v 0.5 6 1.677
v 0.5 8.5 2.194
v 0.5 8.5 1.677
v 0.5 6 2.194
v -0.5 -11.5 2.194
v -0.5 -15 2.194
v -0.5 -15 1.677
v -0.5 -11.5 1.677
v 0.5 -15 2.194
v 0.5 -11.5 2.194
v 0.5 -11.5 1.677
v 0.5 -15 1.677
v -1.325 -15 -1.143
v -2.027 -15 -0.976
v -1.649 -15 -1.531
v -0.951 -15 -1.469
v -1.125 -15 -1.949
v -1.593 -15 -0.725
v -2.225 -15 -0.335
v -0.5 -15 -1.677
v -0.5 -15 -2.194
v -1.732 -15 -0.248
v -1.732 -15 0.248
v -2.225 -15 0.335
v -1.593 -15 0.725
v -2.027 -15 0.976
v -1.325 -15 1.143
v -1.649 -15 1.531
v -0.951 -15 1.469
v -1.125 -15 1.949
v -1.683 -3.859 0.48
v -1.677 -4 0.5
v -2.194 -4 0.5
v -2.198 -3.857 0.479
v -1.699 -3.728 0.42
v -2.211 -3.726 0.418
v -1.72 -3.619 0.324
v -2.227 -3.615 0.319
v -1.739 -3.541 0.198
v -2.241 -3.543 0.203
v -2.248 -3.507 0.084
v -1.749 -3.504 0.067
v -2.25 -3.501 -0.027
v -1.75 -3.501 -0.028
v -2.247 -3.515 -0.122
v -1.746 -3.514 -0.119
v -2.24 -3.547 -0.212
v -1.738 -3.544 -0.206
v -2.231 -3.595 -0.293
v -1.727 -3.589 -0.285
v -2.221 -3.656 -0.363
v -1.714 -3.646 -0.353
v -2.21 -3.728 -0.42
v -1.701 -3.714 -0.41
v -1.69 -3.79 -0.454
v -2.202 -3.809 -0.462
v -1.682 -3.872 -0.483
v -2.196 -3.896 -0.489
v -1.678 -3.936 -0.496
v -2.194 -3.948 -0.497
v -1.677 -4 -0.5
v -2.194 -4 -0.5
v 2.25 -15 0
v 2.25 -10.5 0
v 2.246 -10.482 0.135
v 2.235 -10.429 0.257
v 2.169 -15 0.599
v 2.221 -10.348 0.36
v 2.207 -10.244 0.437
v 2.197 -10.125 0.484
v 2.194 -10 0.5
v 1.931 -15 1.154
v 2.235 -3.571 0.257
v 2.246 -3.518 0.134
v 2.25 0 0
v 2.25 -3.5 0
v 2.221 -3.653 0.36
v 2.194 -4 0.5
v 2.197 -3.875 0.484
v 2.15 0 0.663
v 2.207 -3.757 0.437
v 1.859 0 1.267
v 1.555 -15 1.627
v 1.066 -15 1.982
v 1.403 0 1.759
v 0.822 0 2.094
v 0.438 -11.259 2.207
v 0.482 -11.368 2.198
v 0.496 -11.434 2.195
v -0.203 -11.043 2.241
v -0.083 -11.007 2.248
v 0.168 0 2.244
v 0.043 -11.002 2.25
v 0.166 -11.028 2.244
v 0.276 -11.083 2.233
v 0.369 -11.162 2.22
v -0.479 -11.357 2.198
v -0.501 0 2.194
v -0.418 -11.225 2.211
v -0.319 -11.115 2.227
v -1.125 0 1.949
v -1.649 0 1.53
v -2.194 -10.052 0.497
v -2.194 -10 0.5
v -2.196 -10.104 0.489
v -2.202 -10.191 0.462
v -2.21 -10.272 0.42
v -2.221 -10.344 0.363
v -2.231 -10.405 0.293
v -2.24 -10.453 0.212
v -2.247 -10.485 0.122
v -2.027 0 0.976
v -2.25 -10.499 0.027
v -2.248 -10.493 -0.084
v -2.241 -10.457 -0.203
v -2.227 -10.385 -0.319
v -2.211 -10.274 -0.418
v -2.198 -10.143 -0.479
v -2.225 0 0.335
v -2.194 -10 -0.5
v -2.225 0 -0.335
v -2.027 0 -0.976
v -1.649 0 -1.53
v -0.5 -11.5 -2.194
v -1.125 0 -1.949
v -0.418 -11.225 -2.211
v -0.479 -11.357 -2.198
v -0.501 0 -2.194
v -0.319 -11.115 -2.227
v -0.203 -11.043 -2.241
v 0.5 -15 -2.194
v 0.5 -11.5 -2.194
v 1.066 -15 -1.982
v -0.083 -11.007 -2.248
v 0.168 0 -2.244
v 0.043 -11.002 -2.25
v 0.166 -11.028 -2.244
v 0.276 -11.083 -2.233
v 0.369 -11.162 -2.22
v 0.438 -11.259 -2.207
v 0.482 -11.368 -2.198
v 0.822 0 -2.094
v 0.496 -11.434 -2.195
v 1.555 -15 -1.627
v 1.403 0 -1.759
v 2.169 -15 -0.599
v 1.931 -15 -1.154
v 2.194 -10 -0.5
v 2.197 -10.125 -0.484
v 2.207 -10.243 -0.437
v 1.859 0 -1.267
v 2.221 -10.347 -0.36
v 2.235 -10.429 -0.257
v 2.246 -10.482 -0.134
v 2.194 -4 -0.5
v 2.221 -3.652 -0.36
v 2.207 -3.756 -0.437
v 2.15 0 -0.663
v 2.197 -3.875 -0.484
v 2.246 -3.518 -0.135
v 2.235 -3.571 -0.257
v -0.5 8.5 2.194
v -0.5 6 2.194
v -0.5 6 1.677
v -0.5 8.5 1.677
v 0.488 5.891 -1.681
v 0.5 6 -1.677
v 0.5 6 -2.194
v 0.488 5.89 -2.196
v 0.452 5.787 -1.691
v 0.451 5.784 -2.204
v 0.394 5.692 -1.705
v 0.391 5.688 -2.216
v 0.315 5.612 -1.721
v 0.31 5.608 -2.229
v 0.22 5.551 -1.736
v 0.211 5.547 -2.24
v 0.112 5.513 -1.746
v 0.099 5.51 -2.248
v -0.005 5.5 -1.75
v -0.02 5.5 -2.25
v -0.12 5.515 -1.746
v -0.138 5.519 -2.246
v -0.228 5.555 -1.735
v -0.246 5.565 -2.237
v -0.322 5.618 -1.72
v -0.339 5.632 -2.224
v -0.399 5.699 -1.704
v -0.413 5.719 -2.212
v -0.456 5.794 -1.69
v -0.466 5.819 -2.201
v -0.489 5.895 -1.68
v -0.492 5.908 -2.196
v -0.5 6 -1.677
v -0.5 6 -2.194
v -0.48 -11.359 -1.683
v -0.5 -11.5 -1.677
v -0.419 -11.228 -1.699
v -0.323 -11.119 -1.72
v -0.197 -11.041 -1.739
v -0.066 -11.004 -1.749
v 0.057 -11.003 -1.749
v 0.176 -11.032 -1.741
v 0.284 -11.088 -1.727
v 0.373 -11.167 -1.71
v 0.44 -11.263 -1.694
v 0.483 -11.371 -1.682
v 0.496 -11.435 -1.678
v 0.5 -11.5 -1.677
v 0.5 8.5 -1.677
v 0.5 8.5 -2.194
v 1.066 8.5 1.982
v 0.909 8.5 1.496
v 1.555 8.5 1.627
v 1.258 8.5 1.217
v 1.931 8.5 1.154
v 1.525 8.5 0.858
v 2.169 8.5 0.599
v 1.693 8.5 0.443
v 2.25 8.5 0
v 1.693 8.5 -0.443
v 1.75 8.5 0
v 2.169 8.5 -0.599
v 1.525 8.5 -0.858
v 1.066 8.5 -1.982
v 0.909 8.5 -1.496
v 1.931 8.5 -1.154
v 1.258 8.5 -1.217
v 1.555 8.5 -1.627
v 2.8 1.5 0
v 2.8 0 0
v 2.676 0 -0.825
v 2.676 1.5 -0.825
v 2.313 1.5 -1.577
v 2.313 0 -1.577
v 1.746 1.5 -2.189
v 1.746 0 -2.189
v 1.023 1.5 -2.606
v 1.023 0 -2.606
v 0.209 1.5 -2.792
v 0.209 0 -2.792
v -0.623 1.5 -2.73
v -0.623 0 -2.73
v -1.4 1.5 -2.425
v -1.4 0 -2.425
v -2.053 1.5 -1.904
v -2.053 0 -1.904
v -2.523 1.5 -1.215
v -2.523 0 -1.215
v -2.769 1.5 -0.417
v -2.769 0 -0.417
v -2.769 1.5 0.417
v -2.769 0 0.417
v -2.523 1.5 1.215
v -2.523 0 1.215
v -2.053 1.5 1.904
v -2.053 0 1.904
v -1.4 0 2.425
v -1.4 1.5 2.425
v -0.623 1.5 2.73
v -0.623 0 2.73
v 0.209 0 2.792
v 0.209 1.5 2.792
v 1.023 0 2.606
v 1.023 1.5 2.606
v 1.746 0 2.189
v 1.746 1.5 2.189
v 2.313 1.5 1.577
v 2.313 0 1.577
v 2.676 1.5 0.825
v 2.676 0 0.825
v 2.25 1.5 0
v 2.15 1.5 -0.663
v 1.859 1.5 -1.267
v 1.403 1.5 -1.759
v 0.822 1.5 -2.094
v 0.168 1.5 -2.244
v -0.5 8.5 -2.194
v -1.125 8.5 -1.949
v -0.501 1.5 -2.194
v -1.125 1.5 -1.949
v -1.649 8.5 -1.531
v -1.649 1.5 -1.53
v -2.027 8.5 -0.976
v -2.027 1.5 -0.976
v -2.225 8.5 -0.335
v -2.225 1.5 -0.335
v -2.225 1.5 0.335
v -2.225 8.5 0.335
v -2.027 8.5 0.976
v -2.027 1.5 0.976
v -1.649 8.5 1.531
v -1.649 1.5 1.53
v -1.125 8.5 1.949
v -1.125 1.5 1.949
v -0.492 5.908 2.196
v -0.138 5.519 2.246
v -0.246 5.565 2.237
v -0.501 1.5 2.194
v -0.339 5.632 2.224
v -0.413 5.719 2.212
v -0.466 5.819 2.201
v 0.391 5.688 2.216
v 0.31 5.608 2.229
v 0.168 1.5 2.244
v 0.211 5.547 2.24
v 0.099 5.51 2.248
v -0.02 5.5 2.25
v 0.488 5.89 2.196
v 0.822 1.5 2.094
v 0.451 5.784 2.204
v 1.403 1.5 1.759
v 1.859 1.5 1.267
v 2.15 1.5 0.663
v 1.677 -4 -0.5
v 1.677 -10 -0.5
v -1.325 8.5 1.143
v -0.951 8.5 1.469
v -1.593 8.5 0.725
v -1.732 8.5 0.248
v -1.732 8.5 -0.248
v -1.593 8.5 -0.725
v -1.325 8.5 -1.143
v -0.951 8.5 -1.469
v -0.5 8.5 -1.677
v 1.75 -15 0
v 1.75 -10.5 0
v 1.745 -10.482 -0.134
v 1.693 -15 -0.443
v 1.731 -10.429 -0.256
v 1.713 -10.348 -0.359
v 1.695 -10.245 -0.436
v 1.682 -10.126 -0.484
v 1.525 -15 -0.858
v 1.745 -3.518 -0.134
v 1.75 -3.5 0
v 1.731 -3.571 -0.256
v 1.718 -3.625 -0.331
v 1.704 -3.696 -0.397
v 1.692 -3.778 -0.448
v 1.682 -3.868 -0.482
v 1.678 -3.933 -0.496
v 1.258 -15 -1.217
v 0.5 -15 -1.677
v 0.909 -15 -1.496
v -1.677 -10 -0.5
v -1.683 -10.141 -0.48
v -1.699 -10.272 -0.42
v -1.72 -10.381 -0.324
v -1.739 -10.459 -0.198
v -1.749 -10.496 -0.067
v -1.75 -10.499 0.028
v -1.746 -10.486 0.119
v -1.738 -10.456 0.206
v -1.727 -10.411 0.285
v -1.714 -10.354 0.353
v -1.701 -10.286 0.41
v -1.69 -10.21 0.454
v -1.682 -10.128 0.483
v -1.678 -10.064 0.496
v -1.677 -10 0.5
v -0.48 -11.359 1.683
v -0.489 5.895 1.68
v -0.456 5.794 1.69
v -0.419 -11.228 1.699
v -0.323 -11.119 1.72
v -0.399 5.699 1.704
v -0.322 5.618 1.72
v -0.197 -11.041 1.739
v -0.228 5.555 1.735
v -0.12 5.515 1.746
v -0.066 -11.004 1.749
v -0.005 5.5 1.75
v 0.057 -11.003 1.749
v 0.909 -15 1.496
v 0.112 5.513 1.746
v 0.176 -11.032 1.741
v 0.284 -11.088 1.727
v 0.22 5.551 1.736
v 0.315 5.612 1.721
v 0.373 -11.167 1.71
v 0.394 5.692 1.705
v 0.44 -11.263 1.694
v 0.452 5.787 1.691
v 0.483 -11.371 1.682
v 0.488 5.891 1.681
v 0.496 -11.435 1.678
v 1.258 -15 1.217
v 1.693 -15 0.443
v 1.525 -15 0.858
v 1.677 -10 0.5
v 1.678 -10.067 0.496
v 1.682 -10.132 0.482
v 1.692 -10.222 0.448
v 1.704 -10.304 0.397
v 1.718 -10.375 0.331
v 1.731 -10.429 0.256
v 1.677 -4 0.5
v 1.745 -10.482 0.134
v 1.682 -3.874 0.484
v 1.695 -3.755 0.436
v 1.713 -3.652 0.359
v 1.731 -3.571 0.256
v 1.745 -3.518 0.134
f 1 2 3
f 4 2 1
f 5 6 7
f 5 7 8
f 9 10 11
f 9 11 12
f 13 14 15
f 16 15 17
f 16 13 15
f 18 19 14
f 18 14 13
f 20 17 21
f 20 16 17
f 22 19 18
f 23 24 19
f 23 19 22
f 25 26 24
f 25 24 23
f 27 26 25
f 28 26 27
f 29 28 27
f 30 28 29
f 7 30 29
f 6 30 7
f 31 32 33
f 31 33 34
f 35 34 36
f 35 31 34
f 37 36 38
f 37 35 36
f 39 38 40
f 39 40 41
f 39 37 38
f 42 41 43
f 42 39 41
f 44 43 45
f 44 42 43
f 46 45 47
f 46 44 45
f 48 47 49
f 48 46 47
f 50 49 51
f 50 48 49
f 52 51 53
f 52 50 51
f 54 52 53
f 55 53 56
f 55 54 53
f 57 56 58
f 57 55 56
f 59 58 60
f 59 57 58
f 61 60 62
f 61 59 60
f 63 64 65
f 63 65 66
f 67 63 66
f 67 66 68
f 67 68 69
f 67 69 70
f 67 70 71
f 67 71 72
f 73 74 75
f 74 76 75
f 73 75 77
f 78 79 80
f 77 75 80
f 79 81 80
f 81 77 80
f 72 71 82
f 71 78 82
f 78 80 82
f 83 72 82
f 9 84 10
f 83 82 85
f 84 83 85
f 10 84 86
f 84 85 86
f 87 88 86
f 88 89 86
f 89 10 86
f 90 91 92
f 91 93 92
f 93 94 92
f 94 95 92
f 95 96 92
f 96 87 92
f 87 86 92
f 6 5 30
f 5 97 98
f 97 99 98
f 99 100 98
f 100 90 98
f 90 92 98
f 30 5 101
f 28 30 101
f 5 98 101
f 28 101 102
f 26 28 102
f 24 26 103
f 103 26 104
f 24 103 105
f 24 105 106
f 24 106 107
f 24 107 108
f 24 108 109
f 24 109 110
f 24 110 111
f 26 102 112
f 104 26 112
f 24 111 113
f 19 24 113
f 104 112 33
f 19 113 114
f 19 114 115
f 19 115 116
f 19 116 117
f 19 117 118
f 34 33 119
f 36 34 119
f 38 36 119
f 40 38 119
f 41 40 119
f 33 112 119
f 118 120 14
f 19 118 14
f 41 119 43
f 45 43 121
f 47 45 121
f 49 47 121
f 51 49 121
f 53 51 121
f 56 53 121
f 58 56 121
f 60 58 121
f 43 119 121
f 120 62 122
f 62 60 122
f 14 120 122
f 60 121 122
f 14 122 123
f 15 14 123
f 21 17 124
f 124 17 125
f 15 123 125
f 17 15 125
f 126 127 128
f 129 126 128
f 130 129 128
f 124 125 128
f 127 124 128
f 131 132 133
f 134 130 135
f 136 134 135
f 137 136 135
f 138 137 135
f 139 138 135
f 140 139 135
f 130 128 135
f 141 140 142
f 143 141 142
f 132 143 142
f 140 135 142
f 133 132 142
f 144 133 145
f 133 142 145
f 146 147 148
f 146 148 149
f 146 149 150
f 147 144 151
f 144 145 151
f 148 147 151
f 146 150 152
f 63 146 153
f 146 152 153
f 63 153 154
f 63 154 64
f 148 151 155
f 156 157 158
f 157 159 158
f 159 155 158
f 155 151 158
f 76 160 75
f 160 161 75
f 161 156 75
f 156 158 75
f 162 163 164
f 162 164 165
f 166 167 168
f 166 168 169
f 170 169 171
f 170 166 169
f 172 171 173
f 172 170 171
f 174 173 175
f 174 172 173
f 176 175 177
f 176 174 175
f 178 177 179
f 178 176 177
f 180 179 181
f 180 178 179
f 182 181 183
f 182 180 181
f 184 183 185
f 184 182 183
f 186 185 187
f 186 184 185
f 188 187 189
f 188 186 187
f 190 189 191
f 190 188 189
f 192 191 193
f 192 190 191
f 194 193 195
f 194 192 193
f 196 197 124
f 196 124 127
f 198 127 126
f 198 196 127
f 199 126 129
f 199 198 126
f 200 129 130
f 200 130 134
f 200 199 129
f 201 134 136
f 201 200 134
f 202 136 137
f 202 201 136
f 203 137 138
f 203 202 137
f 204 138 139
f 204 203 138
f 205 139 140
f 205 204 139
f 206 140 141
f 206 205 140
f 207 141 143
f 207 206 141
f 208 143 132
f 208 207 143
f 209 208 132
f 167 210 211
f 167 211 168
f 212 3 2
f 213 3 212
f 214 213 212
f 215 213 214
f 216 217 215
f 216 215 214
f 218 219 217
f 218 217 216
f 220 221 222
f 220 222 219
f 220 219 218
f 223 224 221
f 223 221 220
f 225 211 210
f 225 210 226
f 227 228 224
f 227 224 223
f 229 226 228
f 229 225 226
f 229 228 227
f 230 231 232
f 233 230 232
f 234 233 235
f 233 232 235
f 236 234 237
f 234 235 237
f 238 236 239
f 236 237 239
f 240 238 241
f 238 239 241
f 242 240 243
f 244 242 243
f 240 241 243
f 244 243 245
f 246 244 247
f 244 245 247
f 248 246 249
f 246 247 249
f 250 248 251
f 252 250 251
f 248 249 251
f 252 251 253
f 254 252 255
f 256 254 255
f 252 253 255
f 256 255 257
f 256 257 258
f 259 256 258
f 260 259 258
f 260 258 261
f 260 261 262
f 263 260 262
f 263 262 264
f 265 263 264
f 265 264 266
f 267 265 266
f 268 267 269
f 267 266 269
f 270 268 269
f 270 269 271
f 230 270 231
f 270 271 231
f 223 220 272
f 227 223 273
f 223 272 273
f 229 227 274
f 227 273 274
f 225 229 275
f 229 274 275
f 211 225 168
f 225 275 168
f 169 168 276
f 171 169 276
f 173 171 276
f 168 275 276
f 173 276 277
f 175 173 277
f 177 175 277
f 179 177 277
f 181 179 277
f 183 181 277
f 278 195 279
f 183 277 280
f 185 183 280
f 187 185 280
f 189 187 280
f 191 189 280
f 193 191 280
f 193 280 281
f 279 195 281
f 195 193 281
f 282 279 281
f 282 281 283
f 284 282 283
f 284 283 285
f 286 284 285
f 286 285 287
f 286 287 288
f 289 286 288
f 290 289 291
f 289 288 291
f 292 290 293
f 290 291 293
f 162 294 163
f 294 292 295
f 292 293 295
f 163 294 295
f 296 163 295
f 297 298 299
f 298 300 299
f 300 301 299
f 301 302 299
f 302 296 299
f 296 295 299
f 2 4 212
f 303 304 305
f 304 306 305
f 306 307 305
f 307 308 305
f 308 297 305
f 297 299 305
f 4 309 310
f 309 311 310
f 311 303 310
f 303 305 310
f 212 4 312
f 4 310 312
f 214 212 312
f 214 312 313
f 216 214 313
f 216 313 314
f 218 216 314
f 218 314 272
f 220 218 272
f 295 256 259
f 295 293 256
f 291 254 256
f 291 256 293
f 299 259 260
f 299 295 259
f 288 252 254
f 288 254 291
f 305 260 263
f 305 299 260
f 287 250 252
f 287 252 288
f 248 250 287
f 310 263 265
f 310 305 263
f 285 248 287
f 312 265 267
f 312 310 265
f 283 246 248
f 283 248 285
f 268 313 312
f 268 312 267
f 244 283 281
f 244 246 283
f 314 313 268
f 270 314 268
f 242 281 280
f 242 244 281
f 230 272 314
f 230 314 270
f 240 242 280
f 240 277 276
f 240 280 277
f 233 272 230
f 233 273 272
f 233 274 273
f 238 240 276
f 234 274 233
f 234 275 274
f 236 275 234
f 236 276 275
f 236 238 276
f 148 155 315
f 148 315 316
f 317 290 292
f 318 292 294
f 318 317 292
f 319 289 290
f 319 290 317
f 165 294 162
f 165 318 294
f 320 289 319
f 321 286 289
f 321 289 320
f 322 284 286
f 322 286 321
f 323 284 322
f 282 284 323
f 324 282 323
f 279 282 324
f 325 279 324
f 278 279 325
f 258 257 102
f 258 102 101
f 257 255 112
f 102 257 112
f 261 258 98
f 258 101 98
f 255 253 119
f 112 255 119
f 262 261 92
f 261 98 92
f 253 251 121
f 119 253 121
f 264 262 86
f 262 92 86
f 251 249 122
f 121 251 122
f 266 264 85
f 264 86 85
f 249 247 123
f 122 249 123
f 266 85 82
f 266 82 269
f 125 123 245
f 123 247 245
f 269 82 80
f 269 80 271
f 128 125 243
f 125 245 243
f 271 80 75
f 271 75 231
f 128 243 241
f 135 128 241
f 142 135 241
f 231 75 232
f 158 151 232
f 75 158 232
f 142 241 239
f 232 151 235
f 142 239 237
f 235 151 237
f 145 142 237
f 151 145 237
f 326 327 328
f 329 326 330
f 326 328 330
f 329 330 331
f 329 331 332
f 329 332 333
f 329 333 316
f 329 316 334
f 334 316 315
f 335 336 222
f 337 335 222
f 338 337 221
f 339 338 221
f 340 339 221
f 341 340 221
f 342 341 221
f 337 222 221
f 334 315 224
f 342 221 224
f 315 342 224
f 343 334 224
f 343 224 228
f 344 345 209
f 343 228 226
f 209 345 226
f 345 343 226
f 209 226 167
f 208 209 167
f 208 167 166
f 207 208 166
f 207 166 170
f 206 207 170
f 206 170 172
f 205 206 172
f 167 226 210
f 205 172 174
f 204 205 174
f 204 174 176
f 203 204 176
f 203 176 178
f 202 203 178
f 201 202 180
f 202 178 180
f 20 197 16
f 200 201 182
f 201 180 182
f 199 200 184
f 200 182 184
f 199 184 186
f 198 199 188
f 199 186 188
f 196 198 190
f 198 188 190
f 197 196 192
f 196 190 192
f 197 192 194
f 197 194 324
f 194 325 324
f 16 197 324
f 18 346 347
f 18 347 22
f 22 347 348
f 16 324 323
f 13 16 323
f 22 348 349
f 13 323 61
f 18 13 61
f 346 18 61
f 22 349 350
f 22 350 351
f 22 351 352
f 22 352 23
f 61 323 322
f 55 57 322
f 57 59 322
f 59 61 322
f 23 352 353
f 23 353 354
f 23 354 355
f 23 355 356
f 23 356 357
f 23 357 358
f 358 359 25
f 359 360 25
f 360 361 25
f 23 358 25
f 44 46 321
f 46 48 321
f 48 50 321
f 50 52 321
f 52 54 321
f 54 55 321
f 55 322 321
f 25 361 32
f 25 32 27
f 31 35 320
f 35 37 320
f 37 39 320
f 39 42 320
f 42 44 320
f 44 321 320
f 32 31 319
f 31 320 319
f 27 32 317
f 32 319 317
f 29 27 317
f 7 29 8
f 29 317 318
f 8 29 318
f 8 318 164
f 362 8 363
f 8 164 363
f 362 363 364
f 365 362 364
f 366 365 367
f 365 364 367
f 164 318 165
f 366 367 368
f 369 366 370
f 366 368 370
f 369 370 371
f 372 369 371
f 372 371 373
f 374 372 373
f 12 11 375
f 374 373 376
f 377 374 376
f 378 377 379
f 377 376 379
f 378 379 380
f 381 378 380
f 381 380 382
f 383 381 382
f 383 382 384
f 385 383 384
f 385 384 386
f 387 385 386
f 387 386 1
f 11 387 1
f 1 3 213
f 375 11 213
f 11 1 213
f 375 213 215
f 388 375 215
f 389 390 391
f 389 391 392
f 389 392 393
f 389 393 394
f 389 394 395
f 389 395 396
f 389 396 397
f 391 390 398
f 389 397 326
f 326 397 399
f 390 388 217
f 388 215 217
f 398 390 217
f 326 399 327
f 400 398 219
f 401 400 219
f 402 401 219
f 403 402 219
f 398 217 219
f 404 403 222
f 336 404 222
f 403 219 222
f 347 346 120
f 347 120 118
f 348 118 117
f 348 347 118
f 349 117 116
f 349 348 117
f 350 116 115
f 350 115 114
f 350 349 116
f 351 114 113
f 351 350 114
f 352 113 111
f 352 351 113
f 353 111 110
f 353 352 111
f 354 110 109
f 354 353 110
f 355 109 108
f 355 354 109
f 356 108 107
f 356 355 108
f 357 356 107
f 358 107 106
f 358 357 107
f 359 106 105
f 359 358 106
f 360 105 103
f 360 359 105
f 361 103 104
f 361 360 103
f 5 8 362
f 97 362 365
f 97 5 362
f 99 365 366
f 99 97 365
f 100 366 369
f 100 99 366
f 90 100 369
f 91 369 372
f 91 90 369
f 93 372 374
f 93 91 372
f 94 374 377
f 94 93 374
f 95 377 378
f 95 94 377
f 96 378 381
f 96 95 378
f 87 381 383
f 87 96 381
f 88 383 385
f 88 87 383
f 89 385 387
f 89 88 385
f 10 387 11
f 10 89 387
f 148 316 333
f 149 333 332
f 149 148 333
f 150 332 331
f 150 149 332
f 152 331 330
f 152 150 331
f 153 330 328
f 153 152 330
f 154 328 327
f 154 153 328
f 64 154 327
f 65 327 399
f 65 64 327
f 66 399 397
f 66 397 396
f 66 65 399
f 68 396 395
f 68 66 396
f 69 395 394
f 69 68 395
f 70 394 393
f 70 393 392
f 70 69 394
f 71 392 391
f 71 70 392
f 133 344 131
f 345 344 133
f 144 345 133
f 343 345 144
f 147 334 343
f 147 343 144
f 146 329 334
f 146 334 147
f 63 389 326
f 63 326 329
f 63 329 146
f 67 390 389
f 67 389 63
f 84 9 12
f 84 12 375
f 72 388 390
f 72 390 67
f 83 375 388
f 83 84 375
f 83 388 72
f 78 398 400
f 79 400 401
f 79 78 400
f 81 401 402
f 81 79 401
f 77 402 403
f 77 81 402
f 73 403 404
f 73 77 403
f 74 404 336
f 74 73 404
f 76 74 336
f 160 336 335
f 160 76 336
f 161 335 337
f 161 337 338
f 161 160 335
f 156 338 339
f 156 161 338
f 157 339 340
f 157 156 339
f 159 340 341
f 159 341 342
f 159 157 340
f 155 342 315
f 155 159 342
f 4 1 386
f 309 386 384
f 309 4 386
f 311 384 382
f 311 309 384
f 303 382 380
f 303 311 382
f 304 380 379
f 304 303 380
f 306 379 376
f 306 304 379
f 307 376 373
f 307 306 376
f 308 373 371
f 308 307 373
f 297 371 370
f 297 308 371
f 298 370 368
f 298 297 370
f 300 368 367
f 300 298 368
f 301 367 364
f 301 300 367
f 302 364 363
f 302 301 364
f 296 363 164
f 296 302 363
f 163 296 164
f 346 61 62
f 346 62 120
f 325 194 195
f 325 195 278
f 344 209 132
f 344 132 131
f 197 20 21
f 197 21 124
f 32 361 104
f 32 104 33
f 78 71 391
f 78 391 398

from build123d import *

# Parameters (mm, degrees)
SKETCH1_R           = 2.8
BOSS_EXTRUDE1_DEPTH = 1.5
SKETCH2_R           = 2.25
BOSS_EXTRUDE2_DEPTH = 7
SKETCH3_R           = 2.25
BOSS_EXTRUDE3_DEPTH = 15
CUT_EXTRUDE1_DEPTH  = 13.8
CUT_EXTRUDE2_DEPTH  = 13.8
SKETCH6_R           = 1.75
CUT_EXTRUDE3_DEPTH  = 26.0000001


with BuildPart() as part:
    # Sketch1 → Boss-Extrude1 (new body)
    with BuildSketch(Plane(origin=(0, 0, 0), x_dir=(1, 0, 0), z_dir=(0, 1, 0))):
        Circle(SKETCH1_R)
    extrude(amount=BOSS_EXTRUDE1_DEPTH)

    # Sketch2 → Boss-Extrude2 (add)
    with BuildSketch(Plane(origin=(0, 1.5, 0), x_dir=(1, 0, 0), z_dir=(0, 1, 0))):
        Circle(SKETCH2_R)
    extrude(amount=BOSS_EXTRUDE2_DEPTH)

    # Sketch3 → Boss-Extrude3 (add)
    with BuildSketch(Plane.XZ):
        Circle(SKETCH3_R)
    extrude(amount=BOSS_EXTRUDE3_DEPTH)

    # Sketch4 → Cut-Extrude1 (cut, through all)
    with BuildSketch(Plane.XY.offset(10)):
        with BuildLine():
            Line((-0.5, 6), (-0.5, 8.5))
            ThreePointArc((-0.5, 8.5), (0, 9), (0.5, 8.5))
            Line((0.5, 8.5), (0.5, 6))
            ThreePointArc((0.5, 6), (0, 5.5), (-0.5, 6))
        make_face()
        with BuildLine():
            Line((0.5, -11.5), (0.5, -15))
            ThreePointArc((0.5, -15), (0, -15.5), (-0.5, -15))
            Line((-0.5, -15), (-0.5, -11.5))
            ThreePointArc((-0.5, -11.5), (0, -11), (0.5, -11.5))
        make_face()
    extrude(amount=-CUT_EXTRUDE1_DEPTH, mode=Mode.SUBTRACT)

    # Sketch5 → Cut-Extrude2 (cut, through all)
    with BuildSketch(Plane(origin=(10, 0, 0), x_dir=(0, 0, -1), z_dir=(1, 0, 0))):
        with BuildLine():
            Line((0.5, -4), (0.5, -10))
            ThreePointArc((0.5, -10), (0, -10.5), (-0.5, -10))
            Line((-0.5, -10), (-0.5, -4))
            ThreePointArc((-0.5, -4), (0, -3.5), (0.5, -4))
        make_face()
    extrude(amount=-CUT_EXTRUDE2_DEPTH, mode=Mode.SUBTRACT)

    # Sketch6 → Cut-Extrude3 (cut, through all)
    with BuildSketch(Plane(origin=(0, 10, 0), x_dir=(1, 0, 0), z_dir=(0, 1, 0))):
        Circle(SKETCH6_R)
    extrude(amount=-CUT_EXTRUDE3_DEPTH, mode=Mode.SUBTRACT)


solid = part.part
